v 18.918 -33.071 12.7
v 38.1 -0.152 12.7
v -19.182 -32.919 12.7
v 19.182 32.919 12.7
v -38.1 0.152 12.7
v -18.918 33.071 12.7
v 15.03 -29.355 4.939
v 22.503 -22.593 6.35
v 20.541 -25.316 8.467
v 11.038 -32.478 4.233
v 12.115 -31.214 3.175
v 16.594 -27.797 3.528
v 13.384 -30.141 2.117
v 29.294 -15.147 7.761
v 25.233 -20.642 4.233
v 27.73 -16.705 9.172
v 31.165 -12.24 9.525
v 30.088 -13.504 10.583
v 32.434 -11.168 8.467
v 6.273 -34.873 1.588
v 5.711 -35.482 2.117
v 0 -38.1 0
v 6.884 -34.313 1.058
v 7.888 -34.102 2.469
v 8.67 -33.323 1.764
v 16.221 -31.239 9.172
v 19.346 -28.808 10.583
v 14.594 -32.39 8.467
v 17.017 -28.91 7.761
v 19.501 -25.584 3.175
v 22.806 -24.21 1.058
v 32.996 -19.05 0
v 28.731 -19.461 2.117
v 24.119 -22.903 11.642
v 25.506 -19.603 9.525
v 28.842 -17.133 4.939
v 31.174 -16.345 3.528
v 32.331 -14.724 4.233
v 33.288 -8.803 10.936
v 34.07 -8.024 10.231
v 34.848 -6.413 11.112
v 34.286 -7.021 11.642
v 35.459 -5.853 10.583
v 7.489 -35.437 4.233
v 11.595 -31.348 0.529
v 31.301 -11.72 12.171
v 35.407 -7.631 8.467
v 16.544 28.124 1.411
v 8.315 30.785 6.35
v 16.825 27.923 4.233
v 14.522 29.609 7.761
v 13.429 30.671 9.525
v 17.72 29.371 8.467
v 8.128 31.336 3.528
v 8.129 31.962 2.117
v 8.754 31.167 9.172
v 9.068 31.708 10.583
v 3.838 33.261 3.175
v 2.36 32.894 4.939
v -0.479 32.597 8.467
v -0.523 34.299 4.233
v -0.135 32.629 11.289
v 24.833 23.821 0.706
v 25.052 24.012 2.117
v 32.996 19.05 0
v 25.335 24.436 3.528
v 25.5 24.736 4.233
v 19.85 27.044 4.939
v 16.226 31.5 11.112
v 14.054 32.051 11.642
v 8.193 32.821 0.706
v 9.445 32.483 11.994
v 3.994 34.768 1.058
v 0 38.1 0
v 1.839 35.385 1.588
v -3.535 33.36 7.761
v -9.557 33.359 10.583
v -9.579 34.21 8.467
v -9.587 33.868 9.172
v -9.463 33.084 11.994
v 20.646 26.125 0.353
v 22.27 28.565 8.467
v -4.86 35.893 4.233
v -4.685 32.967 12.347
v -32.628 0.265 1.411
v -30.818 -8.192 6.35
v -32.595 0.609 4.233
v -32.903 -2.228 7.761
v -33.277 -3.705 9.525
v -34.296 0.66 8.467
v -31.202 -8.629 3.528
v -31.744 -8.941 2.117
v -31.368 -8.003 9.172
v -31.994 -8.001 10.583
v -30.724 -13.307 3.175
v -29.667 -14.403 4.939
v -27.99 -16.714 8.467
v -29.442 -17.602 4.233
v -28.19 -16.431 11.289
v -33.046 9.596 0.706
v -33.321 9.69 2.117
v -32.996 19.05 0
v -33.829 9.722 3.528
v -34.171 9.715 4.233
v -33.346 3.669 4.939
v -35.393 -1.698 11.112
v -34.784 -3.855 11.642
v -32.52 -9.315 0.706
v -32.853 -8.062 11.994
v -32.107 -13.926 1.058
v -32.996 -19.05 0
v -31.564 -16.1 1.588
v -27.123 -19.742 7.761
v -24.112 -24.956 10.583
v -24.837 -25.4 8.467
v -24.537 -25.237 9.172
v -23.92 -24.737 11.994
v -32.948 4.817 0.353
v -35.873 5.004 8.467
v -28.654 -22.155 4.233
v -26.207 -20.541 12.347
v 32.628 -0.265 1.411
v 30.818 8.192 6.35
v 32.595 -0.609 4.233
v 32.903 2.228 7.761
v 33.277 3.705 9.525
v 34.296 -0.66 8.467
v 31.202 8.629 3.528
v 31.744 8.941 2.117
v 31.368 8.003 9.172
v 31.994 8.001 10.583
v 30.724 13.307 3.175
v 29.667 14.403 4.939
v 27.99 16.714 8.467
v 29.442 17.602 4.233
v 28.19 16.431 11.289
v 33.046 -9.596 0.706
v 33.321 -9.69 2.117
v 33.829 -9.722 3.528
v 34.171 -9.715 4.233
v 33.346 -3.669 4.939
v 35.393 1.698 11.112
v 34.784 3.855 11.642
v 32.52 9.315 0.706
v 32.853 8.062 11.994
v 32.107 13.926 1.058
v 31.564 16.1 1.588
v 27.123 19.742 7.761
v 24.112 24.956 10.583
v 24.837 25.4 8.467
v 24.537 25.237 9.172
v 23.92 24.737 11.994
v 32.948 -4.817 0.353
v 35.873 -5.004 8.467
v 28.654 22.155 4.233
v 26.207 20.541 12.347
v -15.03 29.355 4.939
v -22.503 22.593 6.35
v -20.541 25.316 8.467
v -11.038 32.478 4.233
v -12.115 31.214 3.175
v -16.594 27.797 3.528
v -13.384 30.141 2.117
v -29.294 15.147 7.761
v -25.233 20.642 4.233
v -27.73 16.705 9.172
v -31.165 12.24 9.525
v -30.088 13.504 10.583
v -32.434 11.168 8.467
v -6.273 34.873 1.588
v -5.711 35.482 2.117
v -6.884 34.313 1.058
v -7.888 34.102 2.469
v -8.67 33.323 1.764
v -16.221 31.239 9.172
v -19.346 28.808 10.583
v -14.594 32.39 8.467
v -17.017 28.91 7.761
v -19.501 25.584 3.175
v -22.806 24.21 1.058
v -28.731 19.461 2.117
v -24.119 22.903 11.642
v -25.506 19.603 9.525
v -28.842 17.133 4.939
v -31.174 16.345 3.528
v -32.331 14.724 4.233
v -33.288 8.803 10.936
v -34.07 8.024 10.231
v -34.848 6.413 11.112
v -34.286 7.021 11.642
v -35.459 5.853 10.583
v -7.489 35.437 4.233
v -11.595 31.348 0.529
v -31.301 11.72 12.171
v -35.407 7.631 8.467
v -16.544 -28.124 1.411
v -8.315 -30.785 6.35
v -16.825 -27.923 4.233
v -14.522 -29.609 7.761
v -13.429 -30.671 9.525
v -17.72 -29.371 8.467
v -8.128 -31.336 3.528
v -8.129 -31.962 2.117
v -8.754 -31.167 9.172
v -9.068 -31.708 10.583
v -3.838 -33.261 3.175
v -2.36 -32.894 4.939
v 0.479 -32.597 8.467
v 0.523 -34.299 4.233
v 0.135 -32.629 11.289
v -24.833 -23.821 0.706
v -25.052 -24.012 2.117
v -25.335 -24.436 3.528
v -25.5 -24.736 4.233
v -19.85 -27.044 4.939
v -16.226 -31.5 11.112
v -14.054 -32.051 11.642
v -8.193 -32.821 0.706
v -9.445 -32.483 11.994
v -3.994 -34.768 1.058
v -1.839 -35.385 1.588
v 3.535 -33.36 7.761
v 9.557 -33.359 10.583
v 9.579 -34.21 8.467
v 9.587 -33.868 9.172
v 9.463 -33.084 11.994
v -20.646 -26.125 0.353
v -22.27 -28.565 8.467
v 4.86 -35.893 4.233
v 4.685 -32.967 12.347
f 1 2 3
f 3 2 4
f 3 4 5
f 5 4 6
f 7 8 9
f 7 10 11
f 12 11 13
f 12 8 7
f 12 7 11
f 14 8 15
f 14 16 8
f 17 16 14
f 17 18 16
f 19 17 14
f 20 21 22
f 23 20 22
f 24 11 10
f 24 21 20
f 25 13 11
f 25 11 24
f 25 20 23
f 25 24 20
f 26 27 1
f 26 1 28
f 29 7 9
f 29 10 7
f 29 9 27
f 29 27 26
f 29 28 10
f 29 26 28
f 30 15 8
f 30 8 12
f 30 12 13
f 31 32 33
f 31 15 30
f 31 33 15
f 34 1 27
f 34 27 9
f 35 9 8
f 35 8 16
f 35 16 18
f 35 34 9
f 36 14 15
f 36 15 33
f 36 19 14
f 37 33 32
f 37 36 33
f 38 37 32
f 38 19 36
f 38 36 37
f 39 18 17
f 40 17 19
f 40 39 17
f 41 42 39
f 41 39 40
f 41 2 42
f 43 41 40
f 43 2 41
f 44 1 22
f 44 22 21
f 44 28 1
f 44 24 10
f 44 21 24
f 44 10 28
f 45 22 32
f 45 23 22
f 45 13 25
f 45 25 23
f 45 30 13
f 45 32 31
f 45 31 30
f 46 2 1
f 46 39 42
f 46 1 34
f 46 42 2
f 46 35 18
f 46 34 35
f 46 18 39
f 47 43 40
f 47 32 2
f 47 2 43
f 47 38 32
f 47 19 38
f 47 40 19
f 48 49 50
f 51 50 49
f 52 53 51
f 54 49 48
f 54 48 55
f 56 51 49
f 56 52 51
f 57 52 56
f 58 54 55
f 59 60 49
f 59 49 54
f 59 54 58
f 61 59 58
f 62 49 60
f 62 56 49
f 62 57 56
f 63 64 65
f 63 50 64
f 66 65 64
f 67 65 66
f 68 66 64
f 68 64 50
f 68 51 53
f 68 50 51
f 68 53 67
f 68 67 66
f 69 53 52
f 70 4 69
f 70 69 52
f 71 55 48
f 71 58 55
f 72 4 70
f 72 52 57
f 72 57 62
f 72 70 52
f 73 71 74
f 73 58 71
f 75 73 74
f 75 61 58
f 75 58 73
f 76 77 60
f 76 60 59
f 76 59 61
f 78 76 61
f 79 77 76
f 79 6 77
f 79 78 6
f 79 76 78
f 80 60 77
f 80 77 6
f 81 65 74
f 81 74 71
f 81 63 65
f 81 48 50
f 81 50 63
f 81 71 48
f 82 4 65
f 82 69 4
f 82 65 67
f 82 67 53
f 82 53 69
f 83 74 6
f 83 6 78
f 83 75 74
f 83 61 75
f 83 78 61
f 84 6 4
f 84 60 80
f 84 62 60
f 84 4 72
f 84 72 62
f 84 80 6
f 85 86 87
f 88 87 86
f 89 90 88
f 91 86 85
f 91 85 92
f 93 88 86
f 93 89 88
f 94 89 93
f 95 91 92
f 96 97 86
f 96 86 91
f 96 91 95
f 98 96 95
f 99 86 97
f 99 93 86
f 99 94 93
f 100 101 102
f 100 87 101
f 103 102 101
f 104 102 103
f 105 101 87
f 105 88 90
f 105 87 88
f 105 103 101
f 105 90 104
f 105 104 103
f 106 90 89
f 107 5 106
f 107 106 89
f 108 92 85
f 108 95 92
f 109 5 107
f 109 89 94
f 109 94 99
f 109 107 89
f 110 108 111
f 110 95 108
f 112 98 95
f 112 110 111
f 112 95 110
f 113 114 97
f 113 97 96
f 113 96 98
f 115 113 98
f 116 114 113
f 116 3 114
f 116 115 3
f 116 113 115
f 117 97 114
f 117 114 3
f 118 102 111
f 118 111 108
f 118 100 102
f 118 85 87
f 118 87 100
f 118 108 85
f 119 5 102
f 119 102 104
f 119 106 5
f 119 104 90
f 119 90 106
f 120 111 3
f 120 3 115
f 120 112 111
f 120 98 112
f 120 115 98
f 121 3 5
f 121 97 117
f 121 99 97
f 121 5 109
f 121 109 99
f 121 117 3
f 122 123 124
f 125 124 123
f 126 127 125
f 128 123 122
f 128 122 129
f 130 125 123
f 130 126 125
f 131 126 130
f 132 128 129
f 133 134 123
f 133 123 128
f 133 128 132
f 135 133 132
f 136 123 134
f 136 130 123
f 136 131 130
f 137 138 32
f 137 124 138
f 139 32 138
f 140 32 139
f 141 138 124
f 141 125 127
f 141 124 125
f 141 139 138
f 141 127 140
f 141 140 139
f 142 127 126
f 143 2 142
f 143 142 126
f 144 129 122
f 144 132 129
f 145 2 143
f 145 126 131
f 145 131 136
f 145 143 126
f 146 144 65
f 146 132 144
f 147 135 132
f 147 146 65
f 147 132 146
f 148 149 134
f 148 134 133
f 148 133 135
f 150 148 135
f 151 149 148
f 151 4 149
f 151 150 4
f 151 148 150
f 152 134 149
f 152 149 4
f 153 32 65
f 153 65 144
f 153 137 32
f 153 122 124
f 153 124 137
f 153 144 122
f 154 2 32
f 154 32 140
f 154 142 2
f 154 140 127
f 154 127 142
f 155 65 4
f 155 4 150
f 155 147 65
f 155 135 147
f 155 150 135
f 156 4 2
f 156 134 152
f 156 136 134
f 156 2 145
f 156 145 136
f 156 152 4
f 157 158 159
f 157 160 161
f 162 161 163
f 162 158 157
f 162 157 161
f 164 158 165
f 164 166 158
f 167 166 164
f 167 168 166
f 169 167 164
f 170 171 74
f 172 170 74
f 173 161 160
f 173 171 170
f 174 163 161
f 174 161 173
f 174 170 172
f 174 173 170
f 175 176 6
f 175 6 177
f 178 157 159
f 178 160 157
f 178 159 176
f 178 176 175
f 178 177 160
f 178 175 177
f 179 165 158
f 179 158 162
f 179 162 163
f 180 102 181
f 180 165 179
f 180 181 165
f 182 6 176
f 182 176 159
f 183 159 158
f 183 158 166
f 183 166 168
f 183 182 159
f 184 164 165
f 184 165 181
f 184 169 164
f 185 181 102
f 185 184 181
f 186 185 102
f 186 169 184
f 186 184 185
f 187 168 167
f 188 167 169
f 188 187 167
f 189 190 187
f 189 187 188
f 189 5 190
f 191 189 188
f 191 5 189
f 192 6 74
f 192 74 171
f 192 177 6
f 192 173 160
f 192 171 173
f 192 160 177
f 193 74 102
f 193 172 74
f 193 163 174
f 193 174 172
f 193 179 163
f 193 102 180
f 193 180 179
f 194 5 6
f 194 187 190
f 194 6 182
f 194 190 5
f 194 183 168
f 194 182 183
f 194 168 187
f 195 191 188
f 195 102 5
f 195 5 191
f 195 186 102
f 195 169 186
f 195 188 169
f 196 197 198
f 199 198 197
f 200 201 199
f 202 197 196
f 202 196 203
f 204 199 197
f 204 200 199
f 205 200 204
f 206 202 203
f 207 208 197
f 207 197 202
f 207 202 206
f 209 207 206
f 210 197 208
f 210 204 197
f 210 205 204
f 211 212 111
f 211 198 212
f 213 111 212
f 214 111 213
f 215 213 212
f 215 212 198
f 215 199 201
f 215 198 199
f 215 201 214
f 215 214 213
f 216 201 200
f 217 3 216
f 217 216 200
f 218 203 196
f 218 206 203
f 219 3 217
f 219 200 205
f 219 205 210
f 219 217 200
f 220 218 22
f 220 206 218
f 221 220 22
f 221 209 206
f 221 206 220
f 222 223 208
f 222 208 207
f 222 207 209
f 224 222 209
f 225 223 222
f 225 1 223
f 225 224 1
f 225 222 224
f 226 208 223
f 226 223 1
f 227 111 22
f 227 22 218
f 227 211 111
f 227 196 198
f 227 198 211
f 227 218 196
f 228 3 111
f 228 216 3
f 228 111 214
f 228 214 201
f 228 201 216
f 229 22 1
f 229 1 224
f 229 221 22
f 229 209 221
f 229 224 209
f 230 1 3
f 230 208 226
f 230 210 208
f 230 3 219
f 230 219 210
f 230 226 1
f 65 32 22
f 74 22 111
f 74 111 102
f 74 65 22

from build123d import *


with BuildPart() as f3:
    # F0 (on Top) → F3 section 0
    with BuildSketch(Plane.XY):
        Polygon((32.995568, -19.05), (32.995568, 19.05), (0, 38.1), (-32.995568, 19.05), (-32.995568, -19.05), (0, -38.1), align=None)
    # F2 (on offset) → F3 section 1
    with BuildSketch(Plane.XY.offset(12.7)):
        Polygon((38.099696, -0.152265), (19.181713, 32.919172), (-18.917983, 33.071437), (-38.099696, 0.152265), (-19.181713, -32.919172), (18.917983, -33.071437), align=None)
    loft()


solid = f3.part
